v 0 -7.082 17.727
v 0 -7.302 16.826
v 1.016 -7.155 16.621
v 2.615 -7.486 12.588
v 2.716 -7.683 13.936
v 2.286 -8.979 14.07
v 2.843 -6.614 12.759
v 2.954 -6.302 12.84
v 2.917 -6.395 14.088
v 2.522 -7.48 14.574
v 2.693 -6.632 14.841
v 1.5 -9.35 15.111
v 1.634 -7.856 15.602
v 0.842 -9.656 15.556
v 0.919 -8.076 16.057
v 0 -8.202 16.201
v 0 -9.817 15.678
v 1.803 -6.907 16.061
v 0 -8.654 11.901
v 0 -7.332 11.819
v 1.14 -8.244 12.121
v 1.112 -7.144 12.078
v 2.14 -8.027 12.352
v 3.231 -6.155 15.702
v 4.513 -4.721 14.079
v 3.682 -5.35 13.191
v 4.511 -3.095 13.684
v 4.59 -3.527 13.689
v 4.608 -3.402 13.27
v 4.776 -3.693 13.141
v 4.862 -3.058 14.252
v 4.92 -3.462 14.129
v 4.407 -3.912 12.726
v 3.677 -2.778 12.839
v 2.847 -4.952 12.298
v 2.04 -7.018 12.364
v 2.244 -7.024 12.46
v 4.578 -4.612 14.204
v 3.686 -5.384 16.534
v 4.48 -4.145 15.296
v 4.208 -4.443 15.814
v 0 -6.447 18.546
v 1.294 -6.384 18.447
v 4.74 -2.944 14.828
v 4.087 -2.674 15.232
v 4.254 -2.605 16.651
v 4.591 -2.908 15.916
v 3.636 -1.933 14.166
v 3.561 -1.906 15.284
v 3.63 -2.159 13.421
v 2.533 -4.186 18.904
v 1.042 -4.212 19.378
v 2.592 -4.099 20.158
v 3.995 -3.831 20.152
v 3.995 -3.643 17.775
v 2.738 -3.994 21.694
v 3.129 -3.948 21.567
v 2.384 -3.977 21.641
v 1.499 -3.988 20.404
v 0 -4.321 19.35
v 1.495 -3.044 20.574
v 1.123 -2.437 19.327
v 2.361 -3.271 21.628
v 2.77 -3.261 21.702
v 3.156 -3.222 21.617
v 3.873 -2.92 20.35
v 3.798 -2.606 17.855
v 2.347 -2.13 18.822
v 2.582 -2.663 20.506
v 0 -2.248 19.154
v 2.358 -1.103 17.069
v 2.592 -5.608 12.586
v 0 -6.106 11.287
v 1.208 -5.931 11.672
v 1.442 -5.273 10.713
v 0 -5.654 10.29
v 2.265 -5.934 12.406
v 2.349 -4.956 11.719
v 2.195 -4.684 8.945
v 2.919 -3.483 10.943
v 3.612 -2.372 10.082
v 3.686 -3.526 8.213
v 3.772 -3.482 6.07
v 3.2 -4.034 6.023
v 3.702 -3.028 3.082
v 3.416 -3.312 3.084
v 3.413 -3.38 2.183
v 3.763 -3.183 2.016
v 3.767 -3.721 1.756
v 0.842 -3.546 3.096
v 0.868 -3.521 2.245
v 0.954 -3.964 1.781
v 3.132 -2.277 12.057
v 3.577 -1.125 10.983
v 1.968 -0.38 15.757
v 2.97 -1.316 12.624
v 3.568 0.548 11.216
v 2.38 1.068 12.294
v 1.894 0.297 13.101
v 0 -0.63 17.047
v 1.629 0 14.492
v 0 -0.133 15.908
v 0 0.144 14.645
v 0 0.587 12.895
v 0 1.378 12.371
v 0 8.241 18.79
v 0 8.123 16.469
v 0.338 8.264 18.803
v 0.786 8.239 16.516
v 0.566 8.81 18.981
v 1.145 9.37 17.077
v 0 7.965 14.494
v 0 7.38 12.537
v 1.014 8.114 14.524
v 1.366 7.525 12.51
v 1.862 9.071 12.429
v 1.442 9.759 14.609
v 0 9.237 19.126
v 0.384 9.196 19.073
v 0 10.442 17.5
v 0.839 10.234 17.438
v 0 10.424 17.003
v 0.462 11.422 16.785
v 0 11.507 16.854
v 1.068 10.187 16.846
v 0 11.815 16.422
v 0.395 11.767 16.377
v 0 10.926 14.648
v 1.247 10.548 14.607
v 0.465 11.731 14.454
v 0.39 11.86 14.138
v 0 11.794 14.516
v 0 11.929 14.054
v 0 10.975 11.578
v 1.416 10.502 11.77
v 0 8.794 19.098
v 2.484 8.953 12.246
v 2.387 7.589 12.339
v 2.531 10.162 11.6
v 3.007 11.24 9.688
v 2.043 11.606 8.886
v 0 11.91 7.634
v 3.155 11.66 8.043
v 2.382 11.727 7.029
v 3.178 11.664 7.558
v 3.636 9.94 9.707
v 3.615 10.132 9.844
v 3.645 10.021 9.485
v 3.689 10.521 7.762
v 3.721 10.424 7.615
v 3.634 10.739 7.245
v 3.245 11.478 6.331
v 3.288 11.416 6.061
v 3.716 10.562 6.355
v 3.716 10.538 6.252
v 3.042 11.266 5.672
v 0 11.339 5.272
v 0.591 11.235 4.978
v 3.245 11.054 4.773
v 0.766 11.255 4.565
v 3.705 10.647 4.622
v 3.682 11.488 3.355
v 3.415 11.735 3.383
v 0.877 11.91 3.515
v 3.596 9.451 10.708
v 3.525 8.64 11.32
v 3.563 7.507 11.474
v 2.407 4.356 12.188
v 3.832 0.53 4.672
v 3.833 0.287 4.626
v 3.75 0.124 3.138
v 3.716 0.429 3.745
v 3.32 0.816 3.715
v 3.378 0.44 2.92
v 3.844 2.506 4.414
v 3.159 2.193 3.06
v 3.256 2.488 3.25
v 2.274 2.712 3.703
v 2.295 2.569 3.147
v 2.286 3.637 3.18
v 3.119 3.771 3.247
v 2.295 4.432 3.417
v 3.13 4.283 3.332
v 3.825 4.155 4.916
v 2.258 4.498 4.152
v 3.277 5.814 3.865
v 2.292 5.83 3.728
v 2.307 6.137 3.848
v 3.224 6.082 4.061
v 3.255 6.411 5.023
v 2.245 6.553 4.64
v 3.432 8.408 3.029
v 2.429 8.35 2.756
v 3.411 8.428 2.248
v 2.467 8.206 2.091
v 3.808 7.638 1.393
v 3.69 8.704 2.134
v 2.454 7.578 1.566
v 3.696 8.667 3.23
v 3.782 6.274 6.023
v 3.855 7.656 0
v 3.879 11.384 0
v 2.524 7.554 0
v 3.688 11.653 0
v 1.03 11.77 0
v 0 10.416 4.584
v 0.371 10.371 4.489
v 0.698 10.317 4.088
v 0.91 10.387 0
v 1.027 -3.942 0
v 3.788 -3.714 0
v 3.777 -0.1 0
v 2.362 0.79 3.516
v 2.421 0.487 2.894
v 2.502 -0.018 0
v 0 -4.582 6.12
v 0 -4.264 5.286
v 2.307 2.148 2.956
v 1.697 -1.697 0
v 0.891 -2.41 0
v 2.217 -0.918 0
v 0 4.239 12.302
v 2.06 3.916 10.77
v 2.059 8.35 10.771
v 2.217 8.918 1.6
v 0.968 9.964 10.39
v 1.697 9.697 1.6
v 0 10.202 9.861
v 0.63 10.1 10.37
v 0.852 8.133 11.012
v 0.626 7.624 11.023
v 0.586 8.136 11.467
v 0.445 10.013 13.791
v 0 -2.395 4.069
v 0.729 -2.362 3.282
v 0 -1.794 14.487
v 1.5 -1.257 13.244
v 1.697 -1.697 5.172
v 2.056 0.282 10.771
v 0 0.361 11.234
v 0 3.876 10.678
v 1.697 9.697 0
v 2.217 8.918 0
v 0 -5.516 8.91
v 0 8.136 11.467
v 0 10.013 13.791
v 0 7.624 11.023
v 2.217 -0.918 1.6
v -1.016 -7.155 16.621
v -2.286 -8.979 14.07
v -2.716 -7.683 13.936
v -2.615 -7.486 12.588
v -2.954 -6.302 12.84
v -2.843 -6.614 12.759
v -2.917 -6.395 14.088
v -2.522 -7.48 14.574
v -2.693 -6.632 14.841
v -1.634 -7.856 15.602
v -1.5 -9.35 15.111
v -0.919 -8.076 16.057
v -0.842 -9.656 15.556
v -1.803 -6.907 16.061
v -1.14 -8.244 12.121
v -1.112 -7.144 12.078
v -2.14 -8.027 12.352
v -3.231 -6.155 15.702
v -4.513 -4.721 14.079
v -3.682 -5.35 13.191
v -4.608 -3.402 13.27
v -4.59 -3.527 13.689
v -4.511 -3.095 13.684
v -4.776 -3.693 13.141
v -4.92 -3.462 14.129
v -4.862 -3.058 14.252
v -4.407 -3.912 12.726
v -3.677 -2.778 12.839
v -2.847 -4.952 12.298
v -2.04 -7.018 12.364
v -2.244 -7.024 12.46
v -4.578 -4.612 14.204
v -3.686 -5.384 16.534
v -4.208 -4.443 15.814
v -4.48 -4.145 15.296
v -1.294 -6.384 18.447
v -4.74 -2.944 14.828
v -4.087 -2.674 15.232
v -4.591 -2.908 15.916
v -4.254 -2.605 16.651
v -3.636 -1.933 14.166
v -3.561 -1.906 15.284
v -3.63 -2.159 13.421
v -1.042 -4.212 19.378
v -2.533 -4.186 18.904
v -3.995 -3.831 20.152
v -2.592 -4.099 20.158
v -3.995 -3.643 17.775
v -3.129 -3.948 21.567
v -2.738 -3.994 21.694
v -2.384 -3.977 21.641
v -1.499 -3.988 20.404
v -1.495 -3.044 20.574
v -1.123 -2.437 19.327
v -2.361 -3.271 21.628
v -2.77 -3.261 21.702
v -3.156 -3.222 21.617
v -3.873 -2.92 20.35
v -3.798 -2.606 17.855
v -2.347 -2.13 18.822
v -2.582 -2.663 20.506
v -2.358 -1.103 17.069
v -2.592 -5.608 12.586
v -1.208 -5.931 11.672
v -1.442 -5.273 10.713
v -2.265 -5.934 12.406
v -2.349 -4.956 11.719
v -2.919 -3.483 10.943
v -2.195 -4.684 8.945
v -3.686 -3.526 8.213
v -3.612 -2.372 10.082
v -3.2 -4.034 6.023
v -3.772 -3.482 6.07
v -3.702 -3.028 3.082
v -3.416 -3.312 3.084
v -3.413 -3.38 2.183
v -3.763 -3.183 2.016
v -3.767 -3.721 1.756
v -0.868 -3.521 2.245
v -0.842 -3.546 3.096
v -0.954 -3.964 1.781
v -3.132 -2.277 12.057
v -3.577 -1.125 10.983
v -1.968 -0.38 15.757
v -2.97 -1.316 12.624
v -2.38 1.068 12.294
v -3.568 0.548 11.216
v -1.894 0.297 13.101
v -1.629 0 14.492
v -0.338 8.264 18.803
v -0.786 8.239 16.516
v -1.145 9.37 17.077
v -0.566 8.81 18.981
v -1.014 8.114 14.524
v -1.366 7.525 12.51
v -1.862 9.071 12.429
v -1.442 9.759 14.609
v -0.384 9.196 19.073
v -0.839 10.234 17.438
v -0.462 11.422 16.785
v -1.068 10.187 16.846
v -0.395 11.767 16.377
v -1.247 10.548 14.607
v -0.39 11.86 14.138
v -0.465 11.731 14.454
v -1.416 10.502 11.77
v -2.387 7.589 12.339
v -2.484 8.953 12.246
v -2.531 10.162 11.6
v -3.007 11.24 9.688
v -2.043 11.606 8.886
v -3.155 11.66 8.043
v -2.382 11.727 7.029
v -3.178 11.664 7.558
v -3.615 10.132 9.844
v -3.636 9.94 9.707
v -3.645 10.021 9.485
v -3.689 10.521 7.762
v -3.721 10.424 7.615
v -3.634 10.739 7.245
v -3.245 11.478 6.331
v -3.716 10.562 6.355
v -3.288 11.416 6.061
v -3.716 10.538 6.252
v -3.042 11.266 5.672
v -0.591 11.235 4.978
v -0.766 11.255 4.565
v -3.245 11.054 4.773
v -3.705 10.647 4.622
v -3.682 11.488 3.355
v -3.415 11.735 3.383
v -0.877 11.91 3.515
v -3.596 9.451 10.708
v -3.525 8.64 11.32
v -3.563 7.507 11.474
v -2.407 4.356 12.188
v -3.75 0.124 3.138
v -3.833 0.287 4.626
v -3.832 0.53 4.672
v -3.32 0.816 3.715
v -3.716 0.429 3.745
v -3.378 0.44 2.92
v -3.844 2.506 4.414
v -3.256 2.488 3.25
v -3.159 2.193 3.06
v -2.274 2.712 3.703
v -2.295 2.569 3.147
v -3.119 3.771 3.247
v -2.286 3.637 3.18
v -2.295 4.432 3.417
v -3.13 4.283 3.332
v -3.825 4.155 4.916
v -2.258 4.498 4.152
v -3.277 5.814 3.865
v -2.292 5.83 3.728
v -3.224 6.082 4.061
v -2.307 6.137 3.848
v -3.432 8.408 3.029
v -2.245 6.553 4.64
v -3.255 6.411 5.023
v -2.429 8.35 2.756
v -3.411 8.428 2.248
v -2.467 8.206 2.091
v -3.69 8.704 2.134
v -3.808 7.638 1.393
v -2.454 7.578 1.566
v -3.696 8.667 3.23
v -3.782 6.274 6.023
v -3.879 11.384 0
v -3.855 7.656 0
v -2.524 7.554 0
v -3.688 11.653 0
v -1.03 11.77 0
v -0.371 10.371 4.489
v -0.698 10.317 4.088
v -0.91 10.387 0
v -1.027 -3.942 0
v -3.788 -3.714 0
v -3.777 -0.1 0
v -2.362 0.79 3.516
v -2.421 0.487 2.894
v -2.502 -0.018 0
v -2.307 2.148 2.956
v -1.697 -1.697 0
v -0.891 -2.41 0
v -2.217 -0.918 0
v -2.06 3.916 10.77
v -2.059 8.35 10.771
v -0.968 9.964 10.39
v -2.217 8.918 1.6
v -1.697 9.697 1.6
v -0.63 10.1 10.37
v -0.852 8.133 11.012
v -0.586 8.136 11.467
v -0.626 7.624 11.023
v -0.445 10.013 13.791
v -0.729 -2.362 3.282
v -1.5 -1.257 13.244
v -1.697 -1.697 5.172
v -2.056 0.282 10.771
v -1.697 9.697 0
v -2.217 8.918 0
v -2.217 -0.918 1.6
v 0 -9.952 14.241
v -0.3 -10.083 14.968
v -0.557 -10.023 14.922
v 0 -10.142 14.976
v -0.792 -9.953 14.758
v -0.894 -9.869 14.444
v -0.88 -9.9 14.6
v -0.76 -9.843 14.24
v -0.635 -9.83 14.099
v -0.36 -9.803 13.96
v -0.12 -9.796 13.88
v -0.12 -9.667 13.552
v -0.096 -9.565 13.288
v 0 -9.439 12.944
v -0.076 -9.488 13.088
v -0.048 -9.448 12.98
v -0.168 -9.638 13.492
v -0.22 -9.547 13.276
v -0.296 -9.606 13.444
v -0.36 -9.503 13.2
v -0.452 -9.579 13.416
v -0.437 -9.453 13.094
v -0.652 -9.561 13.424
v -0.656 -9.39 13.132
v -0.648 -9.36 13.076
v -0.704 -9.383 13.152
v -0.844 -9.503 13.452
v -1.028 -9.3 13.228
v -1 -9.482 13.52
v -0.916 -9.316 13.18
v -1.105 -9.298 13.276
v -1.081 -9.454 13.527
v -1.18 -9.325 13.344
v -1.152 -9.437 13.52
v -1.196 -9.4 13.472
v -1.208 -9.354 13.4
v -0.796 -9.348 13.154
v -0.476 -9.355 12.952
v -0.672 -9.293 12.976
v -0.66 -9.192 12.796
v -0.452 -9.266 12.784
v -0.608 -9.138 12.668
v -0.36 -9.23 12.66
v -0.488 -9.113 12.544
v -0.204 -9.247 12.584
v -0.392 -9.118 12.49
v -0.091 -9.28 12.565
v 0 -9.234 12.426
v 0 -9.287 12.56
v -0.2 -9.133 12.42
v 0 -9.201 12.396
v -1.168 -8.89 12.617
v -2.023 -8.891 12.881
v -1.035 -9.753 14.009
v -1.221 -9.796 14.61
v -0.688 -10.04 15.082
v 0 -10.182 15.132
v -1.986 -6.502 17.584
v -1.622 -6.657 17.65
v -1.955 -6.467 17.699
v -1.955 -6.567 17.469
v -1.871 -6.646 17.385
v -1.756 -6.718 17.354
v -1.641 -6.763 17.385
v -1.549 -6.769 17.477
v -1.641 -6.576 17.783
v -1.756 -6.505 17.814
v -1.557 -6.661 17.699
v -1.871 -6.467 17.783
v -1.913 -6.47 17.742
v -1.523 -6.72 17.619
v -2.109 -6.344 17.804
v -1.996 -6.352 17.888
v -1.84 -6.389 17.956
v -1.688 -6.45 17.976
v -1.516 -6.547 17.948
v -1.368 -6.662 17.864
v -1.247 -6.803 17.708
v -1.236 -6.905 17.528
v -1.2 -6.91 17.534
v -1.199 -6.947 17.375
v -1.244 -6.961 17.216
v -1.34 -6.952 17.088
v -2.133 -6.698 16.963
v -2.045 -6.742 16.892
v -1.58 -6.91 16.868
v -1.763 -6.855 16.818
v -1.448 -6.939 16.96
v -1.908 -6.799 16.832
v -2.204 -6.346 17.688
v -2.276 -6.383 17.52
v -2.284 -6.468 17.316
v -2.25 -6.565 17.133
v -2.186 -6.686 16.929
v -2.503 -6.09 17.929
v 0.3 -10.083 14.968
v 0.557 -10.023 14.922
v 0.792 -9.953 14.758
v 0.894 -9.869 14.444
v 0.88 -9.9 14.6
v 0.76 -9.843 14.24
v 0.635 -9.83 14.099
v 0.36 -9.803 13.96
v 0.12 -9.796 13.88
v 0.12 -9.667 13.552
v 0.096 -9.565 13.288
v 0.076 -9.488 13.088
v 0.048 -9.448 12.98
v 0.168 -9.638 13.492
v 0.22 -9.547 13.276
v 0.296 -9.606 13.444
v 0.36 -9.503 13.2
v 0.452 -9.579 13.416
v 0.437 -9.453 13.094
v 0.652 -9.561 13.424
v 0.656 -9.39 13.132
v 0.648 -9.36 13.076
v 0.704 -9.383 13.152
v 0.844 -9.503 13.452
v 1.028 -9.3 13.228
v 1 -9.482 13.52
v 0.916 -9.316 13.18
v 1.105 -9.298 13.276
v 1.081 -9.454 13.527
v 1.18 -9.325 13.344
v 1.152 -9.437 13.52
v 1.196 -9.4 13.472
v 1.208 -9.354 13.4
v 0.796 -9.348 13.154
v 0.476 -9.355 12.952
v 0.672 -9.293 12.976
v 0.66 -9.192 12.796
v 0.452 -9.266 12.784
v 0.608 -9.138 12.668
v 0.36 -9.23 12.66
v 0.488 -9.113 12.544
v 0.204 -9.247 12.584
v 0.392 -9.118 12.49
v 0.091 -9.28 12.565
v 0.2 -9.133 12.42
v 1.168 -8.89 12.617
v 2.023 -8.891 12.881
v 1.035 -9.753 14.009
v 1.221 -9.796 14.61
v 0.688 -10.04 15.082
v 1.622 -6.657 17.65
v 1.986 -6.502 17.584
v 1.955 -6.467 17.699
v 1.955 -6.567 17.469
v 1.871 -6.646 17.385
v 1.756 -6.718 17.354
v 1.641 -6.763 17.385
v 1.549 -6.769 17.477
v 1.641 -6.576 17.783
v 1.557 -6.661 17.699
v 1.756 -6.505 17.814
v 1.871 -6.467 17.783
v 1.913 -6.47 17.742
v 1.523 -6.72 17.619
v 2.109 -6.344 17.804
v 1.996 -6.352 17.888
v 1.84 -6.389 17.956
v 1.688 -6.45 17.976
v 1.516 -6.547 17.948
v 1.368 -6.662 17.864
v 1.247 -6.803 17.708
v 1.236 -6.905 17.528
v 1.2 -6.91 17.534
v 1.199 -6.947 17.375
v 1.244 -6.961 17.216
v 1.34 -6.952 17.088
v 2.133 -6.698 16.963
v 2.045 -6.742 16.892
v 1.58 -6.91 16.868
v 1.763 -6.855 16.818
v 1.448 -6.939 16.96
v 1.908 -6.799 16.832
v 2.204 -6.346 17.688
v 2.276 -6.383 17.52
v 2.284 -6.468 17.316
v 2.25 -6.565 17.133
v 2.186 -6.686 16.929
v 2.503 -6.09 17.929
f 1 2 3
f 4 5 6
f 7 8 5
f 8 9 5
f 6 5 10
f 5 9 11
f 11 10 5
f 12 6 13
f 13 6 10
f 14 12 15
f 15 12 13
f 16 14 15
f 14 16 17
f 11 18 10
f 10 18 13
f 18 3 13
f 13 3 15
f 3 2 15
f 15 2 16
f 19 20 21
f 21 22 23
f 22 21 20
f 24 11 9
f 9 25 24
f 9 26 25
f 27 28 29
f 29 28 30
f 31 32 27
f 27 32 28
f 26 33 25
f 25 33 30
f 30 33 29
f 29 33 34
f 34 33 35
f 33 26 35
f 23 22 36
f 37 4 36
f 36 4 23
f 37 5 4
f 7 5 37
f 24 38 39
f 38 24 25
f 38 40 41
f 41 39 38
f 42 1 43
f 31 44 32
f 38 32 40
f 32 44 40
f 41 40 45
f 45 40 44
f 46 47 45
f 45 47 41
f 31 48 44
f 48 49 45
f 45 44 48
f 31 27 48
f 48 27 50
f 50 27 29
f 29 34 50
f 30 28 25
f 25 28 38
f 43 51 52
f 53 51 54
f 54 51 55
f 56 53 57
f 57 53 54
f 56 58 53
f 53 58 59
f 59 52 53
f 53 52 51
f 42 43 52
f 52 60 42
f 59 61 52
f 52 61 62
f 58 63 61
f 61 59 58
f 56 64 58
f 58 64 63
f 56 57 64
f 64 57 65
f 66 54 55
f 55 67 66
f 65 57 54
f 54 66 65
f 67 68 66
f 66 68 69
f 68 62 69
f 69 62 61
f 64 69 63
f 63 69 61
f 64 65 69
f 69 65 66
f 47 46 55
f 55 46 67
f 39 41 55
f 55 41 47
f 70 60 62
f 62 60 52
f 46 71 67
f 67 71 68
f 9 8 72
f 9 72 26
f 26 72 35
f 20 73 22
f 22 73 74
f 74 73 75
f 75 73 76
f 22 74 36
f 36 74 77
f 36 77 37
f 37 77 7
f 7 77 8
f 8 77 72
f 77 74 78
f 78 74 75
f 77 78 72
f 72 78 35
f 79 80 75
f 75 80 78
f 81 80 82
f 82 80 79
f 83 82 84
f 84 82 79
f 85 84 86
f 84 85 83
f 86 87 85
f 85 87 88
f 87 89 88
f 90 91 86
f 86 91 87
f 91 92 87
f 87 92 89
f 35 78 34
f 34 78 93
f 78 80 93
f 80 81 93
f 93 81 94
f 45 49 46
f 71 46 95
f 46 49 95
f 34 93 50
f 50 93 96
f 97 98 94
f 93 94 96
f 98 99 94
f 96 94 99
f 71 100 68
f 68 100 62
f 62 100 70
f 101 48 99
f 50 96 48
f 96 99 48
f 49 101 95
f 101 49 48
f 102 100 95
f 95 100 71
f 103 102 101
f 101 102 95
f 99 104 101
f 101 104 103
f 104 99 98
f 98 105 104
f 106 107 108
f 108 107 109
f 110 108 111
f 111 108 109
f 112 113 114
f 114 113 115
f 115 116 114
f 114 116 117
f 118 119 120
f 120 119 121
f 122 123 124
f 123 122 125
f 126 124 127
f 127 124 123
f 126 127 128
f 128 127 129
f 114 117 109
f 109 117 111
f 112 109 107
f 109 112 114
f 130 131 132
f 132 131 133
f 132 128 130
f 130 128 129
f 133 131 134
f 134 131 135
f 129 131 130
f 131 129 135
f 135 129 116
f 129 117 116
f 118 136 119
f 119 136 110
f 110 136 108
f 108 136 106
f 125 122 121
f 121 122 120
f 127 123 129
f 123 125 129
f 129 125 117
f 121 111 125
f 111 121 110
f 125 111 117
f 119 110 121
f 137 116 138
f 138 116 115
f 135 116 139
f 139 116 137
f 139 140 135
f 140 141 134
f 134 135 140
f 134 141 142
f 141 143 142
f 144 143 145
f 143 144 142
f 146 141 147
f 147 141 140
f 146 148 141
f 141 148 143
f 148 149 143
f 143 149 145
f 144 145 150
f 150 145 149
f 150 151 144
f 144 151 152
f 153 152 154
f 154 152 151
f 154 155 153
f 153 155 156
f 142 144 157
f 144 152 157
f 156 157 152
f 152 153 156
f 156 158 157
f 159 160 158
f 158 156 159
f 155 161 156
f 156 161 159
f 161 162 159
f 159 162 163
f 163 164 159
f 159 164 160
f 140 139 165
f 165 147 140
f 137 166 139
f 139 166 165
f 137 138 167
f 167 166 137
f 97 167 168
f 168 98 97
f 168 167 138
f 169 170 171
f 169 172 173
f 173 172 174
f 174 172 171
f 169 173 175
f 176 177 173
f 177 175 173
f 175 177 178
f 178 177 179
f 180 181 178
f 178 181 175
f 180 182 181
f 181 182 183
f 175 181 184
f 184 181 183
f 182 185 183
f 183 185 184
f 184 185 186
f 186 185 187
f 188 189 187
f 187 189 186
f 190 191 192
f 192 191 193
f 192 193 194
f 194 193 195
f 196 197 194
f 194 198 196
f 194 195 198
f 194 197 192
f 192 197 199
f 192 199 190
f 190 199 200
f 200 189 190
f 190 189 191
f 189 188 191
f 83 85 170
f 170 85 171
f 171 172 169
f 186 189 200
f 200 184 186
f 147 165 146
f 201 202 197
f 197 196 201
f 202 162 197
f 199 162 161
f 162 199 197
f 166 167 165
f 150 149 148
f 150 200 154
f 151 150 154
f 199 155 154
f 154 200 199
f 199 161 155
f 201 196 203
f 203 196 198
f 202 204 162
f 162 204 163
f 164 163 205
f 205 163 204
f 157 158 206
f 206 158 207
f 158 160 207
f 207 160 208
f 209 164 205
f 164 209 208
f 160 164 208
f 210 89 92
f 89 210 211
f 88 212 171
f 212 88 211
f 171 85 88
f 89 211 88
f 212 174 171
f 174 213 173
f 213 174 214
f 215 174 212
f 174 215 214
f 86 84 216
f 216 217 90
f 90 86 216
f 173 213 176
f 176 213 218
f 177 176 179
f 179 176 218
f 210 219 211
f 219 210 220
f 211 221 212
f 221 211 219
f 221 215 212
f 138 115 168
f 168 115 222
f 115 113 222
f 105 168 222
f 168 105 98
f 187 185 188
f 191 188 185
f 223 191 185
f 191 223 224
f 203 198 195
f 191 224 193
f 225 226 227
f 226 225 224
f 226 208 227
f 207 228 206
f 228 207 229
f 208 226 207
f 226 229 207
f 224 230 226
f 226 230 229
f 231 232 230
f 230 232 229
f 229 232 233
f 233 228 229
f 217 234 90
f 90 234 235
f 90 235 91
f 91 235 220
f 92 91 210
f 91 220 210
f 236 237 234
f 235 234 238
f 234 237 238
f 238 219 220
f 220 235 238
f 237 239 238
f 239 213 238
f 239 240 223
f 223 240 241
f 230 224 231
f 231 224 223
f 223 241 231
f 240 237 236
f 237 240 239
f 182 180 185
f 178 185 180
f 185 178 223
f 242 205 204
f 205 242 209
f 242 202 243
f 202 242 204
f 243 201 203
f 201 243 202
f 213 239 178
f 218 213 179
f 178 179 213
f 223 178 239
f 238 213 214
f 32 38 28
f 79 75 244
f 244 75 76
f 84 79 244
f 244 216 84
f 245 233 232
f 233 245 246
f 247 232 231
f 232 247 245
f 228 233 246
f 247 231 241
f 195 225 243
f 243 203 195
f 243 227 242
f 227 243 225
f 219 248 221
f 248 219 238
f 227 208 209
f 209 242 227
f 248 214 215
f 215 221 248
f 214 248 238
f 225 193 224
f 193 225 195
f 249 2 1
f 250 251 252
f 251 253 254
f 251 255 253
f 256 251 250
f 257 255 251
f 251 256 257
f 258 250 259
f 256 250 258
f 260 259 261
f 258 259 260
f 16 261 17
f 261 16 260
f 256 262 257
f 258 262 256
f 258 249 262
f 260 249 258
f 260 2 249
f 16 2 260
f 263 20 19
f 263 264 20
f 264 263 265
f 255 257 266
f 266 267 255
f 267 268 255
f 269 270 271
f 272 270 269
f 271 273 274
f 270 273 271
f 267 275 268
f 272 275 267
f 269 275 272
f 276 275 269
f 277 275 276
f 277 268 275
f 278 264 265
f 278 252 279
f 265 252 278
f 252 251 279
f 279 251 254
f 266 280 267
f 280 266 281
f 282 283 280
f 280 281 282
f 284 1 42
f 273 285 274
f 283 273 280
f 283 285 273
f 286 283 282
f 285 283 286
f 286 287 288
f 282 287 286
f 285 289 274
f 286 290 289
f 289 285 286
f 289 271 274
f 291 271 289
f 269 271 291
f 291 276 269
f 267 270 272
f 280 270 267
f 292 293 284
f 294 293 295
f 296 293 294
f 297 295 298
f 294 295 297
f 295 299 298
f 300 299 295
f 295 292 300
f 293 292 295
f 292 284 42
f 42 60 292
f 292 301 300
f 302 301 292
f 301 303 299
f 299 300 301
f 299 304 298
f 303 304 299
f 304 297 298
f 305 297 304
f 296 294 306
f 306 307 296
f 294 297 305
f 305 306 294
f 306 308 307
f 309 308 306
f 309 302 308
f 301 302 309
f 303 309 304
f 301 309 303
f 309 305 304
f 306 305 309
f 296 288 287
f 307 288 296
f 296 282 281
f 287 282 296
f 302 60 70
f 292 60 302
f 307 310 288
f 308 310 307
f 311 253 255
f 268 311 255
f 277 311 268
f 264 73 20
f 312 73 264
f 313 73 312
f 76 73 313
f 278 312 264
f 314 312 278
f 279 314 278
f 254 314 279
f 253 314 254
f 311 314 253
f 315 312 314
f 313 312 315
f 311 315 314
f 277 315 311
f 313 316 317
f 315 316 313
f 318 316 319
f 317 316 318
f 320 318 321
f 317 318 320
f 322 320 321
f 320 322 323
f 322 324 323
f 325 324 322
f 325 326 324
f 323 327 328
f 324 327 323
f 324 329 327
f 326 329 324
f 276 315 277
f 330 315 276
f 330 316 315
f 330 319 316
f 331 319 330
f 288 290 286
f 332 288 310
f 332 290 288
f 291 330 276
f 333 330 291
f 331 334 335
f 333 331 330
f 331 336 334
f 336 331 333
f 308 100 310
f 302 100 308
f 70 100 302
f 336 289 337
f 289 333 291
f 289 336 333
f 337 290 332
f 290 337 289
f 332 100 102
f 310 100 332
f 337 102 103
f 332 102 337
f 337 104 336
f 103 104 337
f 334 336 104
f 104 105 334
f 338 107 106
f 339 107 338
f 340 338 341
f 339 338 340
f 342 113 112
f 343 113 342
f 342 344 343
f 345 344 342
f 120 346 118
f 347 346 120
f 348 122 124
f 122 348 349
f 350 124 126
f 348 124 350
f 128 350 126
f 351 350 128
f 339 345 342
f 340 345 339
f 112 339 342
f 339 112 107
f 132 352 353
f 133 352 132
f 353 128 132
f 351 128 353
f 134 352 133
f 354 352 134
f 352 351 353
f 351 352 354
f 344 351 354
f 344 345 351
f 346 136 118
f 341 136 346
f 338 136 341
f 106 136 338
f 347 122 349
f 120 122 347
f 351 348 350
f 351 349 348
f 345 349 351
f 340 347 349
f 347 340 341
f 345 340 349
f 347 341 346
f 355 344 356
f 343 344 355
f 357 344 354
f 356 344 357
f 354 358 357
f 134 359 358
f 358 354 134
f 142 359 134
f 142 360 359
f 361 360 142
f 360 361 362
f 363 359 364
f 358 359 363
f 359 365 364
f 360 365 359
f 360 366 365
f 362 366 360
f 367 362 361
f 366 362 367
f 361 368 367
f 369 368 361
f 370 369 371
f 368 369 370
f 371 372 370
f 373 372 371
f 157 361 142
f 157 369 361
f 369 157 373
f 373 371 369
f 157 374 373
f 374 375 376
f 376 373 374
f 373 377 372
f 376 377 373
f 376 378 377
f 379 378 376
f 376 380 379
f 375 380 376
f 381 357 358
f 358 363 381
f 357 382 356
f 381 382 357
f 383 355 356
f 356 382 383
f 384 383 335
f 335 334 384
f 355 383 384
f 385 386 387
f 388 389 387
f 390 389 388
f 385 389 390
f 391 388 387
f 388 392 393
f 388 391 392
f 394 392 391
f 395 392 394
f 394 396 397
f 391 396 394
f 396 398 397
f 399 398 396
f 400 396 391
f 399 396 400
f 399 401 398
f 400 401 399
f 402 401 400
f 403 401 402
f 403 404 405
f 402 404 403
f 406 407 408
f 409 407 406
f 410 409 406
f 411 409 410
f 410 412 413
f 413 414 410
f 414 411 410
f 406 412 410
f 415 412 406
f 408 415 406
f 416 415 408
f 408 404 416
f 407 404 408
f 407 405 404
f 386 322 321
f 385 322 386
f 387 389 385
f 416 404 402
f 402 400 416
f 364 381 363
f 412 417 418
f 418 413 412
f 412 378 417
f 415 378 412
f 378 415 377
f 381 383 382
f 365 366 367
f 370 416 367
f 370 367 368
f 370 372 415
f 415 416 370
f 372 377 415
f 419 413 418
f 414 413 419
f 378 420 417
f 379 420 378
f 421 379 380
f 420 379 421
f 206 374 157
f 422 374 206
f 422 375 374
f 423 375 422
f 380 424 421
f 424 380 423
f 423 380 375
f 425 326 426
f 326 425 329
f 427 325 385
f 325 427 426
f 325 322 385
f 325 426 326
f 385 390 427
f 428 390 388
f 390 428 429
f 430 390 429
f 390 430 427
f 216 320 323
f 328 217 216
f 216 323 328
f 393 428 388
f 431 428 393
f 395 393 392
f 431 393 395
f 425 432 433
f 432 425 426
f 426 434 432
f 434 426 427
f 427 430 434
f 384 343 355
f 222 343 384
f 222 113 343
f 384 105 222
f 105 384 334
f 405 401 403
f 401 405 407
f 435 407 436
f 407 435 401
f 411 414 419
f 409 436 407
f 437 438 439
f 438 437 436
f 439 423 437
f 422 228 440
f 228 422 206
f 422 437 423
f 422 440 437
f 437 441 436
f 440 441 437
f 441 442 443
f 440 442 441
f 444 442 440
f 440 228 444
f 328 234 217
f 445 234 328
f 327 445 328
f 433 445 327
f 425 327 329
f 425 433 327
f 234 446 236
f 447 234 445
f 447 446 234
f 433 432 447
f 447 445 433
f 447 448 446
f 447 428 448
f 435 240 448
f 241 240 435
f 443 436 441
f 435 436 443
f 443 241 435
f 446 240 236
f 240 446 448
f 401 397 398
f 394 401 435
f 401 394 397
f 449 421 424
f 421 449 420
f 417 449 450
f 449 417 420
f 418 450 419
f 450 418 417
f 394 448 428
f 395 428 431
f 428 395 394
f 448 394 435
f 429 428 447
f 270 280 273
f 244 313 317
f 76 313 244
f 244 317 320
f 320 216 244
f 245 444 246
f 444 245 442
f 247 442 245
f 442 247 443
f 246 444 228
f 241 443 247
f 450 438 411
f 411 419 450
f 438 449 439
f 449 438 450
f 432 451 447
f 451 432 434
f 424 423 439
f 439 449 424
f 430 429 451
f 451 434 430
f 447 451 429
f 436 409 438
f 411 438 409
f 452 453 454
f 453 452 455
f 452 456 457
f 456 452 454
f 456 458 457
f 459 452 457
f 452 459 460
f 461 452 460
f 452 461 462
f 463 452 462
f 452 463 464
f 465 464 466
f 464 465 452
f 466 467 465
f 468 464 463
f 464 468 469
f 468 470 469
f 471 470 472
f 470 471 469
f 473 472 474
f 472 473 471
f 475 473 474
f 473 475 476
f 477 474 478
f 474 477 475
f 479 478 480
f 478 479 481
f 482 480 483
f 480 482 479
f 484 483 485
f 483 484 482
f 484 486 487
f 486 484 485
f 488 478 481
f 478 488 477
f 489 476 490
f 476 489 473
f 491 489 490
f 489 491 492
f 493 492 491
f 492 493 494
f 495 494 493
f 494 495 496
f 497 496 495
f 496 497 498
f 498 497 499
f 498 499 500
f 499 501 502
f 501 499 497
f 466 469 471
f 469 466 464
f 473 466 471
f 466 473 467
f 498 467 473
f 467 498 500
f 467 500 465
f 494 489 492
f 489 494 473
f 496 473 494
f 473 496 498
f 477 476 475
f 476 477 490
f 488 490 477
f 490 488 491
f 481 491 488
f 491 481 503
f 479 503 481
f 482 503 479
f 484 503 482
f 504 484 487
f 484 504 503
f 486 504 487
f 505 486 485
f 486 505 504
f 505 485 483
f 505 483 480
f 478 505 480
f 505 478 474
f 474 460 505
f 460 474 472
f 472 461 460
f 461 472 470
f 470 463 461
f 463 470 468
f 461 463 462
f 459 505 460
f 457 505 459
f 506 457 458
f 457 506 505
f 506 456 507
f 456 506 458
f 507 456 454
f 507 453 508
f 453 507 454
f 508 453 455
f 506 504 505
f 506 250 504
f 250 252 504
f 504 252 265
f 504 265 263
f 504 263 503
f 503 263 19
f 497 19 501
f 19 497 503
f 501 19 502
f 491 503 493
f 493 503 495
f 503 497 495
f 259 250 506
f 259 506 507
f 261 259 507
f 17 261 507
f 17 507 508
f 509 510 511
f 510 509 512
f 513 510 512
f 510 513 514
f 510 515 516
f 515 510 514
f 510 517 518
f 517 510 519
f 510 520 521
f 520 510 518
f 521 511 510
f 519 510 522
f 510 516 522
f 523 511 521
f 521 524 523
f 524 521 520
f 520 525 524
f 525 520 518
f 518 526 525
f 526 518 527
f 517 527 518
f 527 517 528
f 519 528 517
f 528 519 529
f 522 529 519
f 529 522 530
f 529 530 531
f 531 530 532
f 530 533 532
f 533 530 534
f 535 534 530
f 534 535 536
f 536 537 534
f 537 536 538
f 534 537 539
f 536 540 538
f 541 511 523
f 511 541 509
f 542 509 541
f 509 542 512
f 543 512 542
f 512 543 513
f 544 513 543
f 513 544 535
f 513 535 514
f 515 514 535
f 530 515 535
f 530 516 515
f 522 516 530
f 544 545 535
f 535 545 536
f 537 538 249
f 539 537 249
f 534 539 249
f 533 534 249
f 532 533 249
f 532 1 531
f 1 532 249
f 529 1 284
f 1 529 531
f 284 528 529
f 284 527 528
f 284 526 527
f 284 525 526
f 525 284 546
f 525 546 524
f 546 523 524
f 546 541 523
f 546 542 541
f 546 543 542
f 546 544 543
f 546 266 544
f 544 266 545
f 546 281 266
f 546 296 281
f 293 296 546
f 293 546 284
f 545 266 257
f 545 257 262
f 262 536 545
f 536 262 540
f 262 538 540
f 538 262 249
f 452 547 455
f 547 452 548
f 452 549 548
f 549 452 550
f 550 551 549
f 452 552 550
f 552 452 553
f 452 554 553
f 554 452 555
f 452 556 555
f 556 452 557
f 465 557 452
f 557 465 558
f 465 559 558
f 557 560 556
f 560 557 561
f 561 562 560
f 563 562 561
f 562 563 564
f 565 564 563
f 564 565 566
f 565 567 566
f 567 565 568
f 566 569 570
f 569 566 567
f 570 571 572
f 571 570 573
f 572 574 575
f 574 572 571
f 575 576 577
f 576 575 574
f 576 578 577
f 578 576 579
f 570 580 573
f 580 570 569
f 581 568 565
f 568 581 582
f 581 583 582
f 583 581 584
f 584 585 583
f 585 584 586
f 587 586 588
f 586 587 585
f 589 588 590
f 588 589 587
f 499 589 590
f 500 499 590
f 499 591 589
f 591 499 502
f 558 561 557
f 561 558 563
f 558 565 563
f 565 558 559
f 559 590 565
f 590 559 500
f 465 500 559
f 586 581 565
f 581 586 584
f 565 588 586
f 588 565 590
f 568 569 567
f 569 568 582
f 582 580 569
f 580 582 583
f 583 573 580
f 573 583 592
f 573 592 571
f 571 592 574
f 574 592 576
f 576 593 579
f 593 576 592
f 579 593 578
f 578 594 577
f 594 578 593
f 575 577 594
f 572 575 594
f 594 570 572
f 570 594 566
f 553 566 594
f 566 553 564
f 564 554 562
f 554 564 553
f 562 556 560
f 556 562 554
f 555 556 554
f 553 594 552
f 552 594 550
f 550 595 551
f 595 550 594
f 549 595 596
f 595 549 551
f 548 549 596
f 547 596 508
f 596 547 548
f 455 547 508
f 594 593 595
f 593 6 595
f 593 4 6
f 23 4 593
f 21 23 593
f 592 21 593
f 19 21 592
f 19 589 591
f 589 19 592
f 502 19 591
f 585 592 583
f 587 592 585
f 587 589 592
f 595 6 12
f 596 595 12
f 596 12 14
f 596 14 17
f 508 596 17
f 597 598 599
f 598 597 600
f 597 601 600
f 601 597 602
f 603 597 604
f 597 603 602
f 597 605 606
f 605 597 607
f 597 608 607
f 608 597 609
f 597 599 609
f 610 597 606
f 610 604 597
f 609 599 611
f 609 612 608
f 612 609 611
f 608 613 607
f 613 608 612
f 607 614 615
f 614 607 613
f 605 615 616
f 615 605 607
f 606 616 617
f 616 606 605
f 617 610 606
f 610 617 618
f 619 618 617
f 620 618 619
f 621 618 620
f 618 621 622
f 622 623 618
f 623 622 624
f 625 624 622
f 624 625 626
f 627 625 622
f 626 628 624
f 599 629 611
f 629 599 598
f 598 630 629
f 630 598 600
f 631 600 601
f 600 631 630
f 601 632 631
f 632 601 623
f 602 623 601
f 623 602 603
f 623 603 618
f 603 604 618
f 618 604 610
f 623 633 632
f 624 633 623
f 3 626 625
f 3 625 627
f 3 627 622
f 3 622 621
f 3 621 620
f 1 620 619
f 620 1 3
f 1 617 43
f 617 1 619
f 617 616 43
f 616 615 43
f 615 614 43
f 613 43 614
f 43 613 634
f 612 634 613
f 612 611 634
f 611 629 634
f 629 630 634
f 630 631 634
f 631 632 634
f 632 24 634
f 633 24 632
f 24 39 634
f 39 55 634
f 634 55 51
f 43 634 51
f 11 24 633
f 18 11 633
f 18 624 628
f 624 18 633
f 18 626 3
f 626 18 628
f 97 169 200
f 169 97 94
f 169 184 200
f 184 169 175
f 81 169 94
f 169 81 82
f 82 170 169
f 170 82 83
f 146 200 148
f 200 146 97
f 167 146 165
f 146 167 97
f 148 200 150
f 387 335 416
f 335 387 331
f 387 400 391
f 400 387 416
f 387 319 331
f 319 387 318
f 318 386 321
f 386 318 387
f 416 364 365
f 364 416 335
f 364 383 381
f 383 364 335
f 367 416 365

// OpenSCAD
use <../lib.scad>
use <s/26078p02s01.scad>
use <s/26078s01.scad>
use <s/26078s04.scad>
function ldraw_lib__26078p02() = [
// 0 Animal Dog Terrier with Black Eyes and Nose and Bright Pink Tongue Pattern
// 0 Name: 26078p02.dat
// 0 Author: Gerald Lasser [GeraldLasser]
// 0 !LDRAW_ORG Part UPDATE 2024-10
// 0 !LICENSE Licensed under CC BY 4.0 : see CAreadme.txt
// 
// 0 BFC CERTIFY CCW
  [0,"BFC","CERTIFY"],
  [0,"BFC","CCW"],
// 
// 0 !KEYWORDS Bricklink 26078pb001, Collectible Minifigures, Dog Show Winner
// 0 !KEYWORDS Rebrickable 26078pr0001, Series 16, Set 71013
// 
// 0 !HISTORY 2024-12-01 [OrionP] Official Update 2024-10
// 
// 
// 1 16 0 0 0 1 0 0 0 1 0 0 0 1 s\26078s01.dat
  [1,16,0,0,0,1,0,0,0,1,0,0,0,1, ldraw_lib__s__26078s01()],
// 1 16 0 0 0 -1 0 0 0 1 0 0 0 1 s\26078s01.dat
  [1,16,0,0,0,-1,0,0,0,1,0,0,0,1, ldraw_lib__s__26078s01()],
// 1 16 0 0 0 1 0 0 0 1 0 0 0 1 s\26078p02s01.dat
  [1,16,0,0,0,1,0,0,0,1,0,0,0,1, ldraw_lib__s__26078p02s01()],
// 1 16 0 0 0 -1 0 0 0 1 0 0 0 1 s\26078p02s01.dat
  [1,16,0,0,0,-1,0,0,0,1,0,0,0,1, ldraw_lib__s__26078p02s01()],
// 1 16 0 0 0 1 0 0 0 1 0 0 0 1 s\26078s04.dat
  [1,16,0,0,0,1,0,0,0,1,0,0,0,1, ldraw_lib__s__26078s04()],
// 1 16 0 0 0 -1 0 0 0 1 0 0 0 1 s\26078s04.dat
  [1,16,0,0,0,-1,0,0,0,1,0,0,0,1, ldraw_lib__s__26078s04()],
];
module ldraw_lib__26078p02(step=0, col=false, unit=2/5, alt=false, line=0.2, solid=!$preview)
    makepoly(ldraw_lib__26078p02(), step=step, col=col, unit=unit, alt=alt, line=line, solid=solid);
ldraw_lib__26078p02(line=0.2);
